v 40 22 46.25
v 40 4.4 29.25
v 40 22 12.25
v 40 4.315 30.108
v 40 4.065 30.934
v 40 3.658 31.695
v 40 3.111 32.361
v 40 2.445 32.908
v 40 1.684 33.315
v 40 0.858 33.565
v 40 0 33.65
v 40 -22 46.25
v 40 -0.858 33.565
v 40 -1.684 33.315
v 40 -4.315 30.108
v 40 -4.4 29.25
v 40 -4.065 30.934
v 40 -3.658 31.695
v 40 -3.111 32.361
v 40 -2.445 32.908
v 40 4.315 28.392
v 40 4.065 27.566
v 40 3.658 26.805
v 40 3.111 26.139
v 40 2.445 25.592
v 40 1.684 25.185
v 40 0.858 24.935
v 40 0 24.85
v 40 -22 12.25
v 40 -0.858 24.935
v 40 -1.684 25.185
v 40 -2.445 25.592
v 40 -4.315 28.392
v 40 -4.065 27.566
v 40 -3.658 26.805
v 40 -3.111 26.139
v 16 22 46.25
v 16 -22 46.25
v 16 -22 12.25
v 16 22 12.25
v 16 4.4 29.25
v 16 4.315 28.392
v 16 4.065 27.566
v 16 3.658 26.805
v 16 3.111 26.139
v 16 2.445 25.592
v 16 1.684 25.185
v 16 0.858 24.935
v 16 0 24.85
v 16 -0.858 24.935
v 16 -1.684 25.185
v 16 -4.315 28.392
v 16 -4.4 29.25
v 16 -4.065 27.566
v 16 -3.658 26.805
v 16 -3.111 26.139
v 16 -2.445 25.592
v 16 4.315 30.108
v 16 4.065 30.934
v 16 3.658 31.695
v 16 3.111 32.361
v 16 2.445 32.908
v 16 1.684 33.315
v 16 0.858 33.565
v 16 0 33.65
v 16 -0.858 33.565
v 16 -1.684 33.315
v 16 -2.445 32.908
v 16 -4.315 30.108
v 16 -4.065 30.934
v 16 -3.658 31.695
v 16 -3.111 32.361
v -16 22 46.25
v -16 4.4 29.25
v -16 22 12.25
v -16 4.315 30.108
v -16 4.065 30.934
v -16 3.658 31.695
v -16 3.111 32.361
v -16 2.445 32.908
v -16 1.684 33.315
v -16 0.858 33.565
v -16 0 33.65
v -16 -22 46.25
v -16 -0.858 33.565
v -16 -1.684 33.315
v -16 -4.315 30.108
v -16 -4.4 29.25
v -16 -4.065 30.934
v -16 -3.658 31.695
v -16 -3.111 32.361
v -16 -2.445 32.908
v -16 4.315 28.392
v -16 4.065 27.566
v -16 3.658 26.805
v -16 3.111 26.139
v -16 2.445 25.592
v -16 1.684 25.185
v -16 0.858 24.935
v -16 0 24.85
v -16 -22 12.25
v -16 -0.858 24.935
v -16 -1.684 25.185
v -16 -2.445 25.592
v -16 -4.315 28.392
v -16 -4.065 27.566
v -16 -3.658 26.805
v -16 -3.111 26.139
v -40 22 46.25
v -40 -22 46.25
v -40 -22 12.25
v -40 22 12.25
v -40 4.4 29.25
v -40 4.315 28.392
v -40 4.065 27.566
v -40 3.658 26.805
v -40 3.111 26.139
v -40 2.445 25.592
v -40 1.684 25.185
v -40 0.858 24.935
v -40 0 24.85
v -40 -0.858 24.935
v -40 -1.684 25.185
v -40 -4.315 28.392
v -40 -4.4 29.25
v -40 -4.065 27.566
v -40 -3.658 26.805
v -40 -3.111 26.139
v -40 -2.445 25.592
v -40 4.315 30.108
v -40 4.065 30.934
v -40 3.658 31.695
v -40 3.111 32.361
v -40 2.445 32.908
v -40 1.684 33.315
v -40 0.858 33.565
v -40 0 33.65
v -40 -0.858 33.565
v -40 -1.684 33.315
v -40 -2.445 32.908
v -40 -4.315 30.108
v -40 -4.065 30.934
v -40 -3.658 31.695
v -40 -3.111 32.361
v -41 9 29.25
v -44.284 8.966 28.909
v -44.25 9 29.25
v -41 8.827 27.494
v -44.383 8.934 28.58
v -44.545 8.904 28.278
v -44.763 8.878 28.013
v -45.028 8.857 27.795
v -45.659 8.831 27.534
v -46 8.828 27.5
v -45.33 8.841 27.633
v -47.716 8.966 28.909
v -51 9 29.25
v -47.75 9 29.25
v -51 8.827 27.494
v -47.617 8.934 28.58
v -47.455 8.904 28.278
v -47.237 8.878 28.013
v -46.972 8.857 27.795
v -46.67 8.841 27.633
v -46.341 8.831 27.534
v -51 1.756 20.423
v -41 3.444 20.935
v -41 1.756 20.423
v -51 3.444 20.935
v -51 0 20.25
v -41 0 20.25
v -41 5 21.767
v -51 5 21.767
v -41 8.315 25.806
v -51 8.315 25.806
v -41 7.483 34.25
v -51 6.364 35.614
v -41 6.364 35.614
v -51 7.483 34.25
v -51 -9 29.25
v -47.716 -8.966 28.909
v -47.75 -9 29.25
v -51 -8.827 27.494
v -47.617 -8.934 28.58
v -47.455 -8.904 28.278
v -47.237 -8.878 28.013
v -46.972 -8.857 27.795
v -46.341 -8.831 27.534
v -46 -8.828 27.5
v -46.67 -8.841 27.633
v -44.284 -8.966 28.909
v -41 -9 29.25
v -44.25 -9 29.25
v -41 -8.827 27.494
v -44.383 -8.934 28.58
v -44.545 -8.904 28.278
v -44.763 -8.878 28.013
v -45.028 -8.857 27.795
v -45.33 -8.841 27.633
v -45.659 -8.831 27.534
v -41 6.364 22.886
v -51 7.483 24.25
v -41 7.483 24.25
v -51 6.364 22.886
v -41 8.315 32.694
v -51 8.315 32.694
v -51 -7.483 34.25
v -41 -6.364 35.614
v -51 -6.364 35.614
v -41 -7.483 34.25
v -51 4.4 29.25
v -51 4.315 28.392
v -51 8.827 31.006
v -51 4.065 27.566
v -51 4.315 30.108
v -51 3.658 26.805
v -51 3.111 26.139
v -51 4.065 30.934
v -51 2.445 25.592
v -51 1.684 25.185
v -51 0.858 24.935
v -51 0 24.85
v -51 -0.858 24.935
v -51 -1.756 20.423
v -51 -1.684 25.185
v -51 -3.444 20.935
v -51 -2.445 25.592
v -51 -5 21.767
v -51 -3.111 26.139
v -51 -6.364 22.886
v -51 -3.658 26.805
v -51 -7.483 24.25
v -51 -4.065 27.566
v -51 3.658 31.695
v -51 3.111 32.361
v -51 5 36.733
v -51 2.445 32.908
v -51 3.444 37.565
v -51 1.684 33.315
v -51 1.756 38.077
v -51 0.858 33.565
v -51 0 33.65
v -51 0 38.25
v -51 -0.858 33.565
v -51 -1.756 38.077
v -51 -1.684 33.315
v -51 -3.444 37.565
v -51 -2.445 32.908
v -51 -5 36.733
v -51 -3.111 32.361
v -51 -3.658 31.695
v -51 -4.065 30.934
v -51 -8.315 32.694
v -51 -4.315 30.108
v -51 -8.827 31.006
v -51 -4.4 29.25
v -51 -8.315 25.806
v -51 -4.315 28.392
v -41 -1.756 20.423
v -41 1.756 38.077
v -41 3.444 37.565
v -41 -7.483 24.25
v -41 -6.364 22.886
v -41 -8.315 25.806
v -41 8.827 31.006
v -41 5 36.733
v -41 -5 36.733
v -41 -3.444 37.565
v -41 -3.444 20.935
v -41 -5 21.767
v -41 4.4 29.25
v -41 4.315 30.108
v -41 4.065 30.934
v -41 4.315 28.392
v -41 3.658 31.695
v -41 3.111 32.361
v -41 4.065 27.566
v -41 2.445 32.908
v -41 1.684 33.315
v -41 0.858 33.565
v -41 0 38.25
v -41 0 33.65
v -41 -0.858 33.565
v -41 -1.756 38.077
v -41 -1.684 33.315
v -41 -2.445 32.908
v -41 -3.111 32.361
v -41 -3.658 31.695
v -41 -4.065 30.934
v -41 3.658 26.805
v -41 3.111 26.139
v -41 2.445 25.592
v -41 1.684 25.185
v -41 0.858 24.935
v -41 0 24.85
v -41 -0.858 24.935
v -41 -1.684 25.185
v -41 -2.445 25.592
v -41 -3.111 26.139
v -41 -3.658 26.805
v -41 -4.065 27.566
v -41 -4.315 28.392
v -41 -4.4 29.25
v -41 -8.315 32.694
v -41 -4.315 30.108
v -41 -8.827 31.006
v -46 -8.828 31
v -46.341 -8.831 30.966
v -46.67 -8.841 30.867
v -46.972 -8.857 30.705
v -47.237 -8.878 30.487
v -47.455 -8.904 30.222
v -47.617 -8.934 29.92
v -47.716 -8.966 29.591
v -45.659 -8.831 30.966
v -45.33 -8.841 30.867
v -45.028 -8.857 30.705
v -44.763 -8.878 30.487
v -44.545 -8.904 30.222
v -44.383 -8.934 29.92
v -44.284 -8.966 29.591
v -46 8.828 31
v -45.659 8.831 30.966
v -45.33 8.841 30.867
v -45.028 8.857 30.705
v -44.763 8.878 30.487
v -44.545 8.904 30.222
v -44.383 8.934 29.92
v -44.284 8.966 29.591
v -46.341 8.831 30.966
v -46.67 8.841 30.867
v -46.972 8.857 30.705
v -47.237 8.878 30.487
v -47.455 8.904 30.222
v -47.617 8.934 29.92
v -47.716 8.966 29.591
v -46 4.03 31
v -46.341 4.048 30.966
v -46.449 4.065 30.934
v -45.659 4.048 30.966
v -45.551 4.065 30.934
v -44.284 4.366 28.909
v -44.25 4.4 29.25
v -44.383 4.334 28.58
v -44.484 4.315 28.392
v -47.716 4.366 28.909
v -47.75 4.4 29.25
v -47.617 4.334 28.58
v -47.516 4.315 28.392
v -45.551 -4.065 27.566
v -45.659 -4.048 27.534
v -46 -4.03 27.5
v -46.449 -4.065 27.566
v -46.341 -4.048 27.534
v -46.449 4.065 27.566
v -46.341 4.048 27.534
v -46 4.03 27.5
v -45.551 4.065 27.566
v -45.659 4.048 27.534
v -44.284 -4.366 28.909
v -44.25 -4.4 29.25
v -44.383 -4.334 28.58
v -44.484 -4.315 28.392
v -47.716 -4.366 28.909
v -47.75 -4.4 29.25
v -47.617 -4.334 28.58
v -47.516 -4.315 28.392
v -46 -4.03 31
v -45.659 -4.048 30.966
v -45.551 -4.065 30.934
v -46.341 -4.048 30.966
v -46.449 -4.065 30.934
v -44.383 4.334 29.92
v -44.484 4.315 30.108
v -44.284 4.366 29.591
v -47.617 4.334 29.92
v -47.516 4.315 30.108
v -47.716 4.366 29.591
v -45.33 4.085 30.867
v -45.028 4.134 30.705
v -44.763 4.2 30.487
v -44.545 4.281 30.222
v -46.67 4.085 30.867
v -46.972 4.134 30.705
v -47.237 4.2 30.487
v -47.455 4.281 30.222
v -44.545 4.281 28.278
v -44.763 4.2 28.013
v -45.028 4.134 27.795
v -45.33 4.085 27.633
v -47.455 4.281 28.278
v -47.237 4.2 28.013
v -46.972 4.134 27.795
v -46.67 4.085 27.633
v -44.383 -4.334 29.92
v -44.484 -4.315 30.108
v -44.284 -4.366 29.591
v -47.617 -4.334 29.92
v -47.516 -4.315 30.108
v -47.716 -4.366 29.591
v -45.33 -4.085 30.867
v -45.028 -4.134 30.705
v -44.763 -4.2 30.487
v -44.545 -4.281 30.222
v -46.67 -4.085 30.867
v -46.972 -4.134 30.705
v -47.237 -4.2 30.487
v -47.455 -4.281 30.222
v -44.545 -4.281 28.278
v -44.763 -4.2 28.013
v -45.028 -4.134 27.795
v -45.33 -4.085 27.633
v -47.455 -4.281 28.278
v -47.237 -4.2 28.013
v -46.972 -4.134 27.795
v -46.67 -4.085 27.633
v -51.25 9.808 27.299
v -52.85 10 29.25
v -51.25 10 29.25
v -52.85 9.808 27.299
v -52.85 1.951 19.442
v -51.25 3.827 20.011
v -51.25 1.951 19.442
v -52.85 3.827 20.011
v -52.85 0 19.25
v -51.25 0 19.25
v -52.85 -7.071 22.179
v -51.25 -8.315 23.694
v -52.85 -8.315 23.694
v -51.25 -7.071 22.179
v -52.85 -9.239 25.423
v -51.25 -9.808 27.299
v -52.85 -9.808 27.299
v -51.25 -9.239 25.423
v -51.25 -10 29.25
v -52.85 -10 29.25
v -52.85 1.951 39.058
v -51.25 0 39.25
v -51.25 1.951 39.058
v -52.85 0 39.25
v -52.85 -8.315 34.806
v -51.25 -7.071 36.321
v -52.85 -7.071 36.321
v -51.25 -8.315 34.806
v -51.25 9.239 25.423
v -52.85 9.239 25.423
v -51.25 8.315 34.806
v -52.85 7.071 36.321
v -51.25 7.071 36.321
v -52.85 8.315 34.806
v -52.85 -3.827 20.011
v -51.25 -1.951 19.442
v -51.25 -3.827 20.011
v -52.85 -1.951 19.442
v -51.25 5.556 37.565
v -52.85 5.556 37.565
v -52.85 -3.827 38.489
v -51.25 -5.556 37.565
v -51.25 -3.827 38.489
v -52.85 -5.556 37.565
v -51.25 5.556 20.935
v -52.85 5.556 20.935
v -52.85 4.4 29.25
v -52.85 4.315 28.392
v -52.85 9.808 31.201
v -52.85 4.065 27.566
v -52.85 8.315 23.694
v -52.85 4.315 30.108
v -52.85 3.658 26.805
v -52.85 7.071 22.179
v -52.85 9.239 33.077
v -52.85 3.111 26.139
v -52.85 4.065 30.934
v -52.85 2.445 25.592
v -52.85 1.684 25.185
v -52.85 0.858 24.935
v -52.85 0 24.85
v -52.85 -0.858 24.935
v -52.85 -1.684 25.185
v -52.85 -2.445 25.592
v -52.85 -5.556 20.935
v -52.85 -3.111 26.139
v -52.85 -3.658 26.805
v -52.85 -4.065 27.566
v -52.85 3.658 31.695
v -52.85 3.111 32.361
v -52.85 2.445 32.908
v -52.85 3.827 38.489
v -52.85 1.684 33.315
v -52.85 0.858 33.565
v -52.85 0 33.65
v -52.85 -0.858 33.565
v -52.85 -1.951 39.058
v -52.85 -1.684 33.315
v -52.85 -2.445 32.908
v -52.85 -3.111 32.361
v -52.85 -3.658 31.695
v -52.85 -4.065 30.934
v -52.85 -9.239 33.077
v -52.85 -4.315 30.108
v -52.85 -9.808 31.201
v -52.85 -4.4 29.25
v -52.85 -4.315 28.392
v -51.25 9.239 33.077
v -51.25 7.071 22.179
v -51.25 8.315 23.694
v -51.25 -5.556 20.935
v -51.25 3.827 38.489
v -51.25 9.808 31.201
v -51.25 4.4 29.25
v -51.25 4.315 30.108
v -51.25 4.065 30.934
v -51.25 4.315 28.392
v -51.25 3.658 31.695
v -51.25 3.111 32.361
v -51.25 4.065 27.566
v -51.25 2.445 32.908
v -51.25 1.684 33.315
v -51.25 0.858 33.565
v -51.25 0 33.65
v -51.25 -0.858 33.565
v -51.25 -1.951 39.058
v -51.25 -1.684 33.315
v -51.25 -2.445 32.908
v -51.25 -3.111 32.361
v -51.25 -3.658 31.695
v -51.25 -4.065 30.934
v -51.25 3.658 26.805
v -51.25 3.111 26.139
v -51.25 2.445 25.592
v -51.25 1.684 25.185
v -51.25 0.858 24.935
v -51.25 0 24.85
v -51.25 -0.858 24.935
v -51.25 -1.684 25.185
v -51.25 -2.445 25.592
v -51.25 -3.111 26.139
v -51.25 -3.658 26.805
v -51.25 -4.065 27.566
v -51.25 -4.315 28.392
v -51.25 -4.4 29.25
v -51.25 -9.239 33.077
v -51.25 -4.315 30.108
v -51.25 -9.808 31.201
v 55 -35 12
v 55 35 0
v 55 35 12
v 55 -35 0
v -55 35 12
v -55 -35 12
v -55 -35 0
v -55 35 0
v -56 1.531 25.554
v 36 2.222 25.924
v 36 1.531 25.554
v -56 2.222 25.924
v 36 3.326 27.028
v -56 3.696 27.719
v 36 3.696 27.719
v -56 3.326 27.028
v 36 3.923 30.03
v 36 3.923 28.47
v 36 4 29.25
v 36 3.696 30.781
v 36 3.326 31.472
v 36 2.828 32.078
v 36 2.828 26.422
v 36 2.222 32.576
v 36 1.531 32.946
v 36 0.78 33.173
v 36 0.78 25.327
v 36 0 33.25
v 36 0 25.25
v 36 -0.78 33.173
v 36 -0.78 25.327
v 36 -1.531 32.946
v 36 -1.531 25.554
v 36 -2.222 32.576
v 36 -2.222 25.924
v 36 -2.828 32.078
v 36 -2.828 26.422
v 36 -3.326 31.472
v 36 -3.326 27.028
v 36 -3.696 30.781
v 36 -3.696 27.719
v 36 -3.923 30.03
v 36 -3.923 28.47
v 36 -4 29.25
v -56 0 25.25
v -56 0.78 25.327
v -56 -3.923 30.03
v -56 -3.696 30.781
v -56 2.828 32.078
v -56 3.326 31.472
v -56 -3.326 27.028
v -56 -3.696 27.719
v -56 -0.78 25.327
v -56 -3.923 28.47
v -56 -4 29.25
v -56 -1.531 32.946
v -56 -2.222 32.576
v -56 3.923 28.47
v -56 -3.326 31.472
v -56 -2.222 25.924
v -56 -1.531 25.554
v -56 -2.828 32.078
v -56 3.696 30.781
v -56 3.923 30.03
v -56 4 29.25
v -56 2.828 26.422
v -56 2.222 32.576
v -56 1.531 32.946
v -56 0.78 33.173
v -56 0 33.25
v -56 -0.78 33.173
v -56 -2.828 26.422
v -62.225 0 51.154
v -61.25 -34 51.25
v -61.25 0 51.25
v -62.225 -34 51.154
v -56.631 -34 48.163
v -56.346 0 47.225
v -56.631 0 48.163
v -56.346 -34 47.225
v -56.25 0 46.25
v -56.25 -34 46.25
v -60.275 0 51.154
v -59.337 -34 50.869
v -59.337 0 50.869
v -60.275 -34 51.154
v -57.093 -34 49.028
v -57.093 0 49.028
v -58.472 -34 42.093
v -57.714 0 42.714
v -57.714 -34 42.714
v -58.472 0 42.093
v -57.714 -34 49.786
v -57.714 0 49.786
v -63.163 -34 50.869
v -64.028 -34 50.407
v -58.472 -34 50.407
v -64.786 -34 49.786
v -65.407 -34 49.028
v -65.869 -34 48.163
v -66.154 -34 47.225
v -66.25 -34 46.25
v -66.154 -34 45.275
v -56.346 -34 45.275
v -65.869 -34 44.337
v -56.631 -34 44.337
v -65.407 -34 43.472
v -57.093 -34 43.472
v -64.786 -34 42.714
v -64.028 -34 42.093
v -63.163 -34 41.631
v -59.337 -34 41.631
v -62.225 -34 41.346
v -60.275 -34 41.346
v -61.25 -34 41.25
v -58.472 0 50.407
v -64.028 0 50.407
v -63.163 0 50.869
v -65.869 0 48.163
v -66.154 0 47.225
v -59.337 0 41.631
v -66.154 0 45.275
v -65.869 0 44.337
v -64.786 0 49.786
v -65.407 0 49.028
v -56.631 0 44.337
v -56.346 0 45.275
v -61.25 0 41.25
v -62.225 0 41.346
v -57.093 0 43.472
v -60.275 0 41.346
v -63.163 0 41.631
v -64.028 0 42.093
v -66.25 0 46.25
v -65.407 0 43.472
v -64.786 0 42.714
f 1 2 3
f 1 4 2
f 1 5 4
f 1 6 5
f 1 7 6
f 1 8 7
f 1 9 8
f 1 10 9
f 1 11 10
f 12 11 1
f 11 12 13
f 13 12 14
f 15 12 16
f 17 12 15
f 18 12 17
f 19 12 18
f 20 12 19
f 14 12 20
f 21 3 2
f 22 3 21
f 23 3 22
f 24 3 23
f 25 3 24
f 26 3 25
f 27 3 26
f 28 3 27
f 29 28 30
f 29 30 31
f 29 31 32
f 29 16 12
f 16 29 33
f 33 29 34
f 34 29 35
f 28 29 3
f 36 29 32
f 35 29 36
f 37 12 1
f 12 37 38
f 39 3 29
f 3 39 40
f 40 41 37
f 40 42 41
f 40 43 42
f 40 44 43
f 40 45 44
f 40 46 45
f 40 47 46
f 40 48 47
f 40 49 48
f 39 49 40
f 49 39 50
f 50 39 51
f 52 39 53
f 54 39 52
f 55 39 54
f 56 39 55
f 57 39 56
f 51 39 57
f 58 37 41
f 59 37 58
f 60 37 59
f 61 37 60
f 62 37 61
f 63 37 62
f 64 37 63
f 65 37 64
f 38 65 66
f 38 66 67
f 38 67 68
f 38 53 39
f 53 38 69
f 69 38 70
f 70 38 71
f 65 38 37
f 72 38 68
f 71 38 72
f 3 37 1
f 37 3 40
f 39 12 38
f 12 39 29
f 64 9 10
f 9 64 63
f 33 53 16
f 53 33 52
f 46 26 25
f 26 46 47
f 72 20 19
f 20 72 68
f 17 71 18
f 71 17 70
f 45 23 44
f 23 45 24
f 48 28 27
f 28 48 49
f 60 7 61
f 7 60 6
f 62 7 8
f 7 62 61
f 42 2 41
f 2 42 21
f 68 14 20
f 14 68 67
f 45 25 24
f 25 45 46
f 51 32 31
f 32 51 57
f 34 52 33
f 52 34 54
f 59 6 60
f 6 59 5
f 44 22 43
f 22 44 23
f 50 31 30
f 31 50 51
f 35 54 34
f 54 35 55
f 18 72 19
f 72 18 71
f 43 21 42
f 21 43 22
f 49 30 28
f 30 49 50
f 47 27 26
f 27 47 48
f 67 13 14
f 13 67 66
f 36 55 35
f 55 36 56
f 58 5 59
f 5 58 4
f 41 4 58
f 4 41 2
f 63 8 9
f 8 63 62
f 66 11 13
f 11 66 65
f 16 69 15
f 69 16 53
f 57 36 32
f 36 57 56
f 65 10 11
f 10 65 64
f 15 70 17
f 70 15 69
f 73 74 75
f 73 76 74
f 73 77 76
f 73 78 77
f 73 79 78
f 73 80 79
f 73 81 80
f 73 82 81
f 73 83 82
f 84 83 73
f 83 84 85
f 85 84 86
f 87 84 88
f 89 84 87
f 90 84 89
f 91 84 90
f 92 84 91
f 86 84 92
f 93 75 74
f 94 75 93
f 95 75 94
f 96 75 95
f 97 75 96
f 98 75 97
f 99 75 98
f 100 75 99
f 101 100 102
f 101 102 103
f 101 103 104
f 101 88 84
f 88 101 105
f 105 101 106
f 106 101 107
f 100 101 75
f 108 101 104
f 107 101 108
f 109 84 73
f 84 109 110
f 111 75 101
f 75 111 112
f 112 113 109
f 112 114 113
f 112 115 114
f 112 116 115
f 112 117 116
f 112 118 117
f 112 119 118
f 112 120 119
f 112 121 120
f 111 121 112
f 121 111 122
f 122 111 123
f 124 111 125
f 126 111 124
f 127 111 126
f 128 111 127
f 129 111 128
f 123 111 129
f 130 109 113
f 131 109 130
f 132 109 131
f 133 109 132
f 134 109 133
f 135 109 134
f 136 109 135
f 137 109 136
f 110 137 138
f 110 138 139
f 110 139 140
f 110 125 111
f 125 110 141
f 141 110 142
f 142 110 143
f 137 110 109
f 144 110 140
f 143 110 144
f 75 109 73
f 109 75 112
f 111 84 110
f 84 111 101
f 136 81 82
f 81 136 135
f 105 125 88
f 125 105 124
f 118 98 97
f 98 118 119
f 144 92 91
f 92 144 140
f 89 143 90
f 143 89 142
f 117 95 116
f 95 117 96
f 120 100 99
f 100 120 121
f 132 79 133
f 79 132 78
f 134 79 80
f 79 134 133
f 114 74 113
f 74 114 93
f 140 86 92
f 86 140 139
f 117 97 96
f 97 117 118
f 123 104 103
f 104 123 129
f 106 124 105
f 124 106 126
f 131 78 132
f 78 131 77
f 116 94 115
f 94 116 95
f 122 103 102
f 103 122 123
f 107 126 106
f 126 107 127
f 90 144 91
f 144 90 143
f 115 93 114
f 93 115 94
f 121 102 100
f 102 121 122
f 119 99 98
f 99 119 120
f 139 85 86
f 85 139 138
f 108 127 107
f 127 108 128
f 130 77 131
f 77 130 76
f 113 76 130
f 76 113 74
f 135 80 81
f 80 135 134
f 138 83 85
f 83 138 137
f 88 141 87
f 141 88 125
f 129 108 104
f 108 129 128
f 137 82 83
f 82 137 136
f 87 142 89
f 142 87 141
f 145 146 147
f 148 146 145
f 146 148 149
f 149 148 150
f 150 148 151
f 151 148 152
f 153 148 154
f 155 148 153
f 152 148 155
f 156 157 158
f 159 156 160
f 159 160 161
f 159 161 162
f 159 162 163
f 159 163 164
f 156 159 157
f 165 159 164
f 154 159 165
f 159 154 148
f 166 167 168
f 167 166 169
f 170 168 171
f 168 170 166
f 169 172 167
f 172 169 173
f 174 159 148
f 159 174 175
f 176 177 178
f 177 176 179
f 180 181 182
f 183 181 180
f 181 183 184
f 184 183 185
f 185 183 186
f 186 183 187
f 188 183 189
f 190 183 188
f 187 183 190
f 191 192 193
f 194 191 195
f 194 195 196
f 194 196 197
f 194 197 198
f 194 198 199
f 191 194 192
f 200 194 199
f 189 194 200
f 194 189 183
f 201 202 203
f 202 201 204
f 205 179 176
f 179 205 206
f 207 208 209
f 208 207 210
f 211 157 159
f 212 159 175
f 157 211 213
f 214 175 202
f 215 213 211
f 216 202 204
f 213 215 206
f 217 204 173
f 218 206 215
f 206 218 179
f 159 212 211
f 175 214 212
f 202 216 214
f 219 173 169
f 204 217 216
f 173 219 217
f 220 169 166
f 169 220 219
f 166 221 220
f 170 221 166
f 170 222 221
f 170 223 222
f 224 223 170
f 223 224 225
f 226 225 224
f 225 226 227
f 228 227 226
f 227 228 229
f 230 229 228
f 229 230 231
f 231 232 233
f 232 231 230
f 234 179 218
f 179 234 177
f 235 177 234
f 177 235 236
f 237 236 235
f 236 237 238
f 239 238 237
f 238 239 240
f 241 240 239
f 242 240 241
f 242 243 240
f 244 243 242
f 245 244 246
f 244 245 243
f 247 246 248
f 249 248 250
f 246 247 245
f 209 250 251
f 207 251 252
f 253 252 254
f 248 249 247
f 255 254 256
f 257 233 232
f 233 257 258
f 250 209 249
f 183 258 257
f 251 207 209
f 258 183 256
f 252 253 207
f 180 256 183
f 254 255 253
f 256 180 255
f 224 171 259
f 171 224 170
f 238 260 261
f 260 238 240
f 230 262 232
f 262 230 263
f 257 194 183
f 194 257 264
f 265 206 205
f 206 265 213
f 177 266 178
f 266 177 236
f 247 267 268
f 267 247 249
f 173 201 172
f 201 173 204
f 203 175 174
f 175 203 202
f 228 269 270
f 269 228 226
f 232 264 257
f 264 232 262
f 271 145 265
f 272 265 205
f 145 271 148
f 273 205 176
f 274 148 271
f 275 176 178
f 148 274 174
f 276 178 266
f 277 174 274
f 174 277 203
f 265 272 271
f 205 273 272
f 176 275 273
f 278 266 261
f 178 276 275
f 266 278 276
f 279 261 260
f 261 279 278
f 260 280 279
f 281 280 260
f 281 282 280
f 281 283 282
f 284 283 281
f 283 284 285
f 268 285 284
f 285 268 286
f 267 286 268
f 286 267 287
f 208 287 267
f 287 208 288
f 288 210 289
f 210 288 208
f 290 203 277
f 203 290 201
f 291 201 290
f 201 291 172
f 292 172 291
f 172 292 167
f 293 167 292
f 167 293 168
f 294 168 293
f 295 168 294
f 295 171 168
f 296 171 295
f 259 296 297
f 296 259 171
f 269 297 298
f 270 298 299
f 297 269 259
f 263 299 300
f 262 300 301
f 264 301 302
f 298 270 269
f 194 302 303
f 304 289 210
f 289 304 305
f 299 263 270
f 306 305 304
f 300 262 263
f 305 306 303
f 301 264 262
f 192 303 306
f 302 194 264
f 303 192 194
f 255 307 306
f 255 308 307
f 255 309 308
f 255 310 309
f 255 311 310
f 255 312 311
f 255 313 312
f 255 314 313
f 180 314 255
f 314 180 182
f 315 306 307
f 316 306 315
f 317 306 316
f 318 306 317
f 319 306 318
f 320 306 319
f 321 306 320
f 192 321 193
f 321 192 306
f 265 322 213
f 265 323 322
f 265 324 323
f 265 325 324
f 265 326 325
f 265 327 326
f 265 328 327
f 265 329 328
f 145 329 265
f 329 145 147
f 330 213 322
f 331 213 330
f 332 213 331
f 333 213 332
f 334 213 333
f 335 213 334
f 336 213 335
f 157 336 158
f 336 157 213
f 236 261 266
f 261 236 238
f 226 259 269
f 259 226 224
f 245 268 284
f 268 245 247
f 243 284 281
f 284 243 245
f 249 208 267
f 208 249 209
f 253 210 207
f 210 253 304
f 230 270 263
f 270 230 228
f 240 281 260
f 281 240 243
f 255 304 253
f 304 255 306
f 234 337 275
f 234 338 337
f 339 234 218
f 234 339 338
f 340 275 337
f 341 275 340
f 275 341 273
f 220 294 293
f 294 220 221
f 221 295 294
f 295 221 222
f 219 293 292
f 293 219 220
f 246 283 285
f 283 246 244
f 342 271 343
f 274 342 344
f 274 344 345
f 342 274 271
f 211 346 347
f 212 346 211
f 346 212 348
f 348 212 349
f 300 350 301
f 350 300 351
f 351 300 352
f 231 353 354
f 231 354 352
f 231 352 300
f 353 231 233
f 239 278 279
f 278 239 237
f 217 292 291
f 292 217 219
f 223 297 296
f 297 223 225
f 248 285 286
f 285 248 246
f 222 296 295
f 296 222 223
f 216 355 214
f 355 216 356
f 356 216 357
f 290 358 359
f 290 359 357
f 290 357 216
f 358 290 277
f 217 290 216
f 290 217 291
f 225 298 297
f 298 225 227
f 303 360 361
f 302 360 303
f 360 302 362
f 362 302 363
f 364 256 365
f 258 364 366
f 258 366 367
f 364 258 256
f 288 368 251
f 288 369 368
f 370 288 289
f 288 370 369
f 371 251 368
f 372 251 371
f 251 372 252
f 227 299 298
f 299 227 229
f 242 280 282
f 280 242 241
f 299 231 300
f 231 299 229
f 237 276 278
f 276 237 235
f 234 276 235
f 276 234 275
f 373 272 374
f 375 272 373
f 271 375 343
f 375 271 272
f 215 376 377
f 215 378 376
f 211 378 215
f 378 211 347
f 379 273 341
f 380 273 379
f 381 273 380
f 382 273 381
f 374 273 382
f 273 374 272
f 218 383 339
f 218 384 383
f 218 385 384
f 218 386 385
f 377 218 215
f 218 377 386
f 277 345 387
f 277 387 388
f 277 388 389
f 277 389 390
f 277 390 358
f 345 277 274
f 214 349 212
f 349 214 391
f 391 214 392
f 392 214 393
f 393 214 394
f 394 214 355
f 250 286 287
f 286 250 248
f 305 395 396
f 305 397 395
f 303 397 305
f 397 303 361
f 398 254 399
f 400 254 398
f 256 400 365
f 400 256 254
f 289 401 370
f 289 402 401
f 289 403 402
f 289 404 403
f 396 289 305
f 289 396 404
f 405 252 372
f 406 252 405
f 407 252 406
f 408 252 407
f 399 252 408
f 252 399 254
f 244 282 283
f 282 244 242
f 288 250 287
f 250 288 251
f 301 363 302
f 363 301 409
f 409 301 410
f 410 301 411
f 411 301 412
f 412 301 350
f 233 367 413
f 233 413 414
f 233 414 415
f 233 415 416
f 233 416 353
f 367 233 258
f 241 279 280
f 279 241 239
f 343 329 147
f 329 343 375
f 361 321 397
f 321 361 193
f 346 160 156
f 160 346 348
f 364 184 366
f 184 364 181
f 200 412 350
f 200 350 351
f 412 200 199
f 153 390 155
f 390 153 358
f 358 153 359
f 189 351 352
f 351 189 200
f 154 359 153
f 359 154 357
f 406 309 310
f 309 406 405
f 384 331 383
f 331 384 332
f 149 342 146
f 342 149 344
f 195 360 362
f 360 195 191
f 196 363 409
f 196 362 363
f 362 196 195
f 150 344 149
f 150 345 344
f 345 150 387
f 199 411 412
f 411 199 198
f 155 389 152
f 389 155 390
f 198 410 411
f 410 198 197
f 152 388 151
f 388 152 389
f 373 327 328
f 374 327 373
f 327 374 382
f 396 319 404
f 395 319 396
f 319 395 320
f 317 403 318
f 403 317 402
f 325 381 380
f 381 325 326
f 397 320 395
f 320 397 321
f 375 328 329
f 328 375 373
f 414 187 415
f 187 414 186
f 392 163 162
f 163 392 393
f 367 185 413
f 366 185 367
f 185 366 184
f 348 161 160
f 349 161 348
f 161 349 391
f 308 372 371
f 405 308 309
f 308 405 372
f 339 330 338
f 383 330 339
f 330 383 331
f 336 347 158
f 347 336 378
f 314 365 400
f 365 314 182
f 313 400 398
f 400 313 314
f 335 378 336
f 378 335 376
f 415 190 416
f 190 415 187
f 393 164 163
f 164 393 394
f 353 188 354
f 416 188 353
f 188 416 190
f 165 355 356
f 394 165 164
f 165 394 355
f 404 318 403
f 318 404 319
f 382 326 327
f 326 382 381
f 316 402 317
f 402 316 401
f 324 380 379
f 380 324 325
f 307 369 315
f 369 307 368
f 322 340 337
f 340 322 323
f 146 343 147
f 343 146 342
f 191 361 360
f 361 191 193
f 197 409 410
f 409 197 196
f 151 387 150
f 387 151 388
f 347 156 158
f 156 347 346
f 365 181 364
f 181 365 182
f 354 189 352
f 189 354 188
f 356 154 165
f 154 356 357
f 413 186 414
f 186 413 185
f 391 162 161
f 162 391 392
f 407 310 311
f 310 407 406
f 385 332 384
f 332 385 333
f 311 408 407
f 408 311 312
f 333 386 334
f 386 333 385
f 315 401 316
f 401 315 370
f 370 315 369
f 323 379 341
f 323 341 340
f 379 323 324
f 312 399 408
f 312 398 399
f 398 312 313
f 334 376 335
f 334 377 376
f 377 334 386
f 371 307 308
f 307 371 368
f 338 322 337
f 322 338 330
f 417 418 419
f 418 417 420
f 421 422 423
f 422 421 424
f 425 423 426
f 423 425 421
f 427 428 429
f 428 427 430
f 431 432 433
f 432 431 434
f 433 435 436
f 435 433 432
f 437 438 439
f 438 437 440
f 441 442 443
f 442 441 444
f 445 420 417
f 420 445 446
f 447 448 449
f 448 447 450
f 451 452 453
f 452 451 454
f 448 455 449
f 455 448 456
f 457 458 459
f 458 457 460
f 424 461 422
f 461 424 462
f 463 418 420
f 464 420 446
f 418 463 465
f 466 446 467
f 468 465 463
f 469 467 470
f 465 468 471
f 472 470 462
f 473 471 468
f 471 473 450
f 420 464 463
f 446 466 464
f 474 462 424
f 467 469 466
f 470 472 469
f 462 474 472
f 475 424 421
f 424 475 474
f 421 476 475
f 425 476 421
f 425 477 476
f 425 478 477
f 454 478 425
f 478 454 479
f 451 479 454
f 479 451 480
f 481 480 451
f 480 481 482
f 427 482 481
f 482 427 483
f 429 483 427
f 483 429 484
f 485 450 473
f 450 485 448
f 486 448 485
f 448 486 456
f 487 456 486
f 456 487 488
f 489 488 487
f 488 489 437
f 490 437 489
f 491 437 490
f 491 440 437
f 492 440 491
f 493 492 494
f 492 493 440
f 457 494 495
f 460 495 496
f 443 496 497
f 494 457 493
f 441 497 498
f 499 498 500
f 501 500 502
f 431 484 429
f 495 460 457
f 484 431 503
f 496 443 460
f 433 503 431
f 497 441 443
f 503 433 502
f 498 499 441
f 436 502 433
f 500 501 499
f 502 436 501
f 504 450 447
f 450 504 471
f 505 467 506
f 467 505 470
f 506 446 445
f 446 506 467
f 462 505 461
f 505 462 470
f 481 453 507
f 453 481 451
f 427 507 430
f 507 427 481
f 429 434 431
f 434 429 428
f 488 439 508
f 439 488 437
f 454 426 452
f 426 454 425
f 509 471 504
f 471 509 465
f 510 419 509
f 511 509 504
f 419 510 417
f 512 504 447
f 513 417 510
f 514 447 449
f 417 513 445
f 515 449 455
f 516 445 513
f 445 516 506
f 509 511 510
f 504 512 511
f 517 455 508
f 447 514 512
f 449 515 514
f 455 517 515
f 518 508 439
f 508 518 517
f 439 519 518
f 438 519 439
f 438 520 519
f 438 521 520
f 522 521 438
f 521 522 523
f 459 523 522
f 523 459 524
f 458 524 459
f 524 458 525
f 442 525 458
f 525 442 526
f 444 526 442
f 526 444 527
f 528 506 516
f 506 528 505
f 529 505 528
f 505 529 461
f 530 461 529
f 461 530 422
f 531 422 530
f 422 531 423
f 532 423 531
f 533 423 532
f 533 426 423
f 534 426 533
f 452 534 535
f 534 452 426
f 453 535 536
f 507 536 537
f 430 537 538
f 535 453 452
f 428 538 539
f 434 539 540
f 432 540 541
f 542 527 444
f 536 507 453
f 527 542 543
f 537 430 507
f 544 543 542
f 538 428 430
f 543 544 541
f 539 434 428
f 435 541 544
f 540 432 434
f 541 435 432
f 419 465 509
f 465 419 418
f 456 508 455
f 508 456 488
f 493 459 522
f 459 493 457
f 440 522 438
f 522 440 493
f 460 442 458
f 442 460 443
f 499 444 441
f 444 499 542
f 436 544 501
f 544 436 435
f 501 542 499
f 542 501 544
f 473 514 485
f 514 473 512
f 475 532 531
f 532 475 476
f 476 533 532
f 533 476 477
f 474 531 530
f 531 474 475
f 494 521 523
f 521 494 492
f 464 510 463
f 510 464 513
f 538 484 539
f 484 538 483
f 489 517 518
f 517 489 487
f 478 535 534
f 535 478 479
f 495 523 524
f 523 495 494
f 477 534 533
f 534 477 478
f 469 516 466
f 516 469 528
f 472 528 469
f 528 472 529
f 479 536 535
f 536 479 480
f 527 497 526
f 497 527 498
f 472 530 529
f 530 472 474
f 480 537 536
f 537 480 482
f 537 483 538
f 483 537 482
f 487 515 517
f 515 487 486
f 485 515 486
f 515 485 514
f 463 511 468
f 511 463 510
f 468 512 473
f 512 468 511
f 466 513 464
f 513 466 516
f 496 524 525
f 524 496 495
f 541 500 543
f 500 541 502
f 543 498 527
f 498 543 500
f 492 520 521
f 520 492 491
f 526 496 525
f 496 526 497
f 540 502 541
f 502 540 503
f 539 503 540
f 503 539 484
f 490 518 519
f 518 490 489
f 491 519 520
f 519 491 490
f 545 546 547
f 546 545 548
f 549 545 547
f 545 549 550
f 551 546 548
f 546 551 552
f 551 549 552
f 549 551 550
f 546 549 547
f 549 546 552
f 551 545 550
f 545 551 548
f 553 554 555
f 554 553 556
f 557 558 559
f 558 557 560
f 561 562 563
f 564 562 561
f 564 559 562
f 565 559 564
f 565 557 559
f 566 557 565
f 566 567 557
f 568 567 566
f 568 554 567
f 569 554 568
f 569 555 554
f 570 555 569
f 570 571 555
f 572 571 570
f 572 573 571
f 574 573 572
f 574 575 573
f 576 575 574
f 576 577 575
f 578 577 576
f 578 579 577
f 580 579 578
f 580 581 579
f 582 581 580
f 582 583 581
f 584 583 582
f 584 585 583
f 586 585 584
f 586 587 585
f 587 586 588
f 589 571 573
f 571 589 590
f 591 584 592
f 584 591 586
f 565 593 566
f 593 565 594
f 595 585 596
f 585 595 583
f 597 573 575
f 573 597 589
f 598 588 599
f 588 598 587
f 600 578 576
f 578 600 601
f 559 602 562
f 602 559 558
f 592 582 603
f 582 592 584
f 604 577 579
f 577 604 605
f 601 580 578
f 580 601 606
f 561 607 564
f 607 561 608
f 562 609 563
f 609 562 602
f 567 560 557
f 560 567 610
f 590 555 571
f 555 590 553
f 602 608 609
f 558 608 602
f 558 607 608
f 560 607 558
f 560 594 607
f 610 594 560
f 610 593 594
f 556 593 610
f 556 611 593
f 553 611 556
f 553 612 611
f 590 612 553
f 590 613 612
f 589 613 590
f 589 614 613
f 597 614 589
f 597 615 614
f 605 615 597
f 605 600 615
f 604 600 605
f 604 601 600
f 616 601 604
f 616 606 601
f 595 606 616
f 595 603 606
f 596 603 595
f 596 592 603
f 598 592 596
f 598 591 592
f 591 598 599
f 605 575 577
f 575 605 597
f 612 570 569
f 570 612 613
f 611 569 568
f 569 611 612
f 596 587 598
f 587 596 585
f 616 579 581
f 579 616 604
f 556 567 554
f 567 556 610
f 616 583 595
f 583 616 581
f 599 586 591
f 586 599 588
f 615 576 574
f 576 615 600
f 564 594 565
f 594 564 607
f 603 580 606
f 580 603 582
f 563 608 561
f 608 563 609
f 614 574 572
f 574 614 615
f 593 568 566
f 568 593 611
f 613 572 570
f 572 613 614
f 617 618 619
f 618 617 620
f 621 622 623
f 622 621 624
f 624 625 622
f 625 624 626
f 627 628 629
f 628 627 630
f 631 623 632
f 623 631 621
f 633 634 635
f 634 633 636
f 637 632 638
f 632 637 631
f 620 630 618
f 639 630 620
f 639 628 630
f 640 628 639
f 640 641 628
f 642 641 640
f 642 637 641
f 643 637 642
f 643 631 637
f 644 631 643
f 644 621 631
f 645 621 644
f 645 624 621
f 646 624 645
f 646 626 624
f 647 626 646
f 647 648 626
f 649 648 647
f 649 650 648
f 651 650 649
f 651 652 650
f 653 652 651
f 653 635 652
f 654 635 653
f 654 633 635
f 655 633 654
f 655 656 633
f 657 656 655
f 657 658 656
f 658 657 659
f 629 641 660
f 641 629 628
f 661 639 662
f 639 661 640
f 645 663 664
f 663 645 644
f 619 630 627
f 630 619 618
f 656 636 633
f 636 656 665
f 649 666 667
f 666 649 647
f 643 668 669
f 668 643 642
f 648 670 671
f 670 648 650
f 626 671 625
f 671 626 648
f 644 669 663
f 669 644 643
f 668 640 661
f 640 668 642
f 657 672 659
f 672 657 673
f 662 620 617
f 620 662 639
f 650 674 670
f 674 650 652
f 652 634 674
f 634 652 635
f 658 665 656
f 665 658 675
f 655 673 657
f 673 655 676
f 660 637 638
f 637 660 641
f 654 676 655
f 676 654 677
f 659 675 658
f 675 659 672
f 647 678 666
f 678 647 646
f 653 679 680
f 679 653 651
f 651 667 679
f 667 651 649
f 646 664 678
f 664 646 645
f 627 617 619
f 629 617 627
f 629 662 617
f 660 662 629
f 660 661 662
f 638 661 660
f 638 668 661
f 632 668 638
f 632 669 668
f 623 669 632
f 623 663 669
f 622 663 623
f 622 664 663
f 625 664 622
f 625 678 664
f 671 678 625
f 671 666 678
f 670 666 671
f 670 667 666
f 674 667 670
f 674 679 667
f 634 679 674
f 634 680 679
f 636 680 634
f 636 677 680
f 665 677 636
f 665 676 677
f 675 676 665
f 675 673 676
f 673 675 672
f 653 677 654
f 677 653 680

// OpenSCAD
$fn = 32;

// ------------------------------------------------------------------------
// Machine vise: screw d8, jaws 24 x 34 mm
// Every part is its own module, assembly() places every instance.
// ------------------------------------------------------------------------

// --- part 1 ---
module vise_bed() {
  difference() {
    translate([-55, -35, 0]) cube([110, 70, 12]);
  }
}

// --- part 2 ---
module vise_jaw() {
  difference() {
    translate([-12, -22, 0]) cube([24, 44, 34]);
    translate([0, 0, 17]) rotate([0, 90, 0]) cylinder(h = 26, d = 8.8, center = true);
  }
}

// --- part 3 ---
module vise_screw() {
  translate([0, 0, -46]) cylinder(h = 92, d = 8);
}

// --- part 4 ---
module screw_collar() {
  difference() {
    cylinder(h = 10, d = 18);
    translate([0, 0, -1]) cylinder(h = 12, d = 8.8);
    translate([0, 0, 5]) rotate([90, 0, 0]) cylinder(h = 20, d = 3.5, center = true);
  }
}

// --- part 5 ---
module screw_washer() {
  difference() {
      translate([0, 0, 0]) cylinder(h = 1.6, d = 20);
      translate([0, 0, -1]) cylinder(h = 3.6, d = 8.8);
    }
}

// --- part 6 ---
module vise_handle() {
  cylinder(h = 34, d = 10);
}

// --- assembly ---
module assembly() {
  color([0.80, 0.24, 0.20]) translate([0, 0, 0]) rotate([0, 0, 0]) vise_bed();
  color([0.20, 0.45, 0.75]) translate([28, 0, 12.25]) rotate([0, 0, 0]) vise_jaw();
  color([0.25, 0.62, 0.32]) translate([-28, 0, 12.25]) rotate([0, 0, 0]) vise_jaw();
  color([0.92, 0.70, 0.18]) translate([-10, 0, 29.25]) rotate([0, 90, 0]) vise_screw();
  color([0.58, 0.35, 0.70]) translate([-51, 0, 29.25]) rotate([0, 90, 0]) screw_collar();
  color([0.16, 0.66, 0.66]) translate([-52.85, 0, 29.25]) rotate([0, 90, 0]) screw_washer();
  color([0.85, 0.48, 0.18]) translate([-61.25, 0, 46.25]) rotate([90, 0, 0]) vise_handle();
}

assembly();
